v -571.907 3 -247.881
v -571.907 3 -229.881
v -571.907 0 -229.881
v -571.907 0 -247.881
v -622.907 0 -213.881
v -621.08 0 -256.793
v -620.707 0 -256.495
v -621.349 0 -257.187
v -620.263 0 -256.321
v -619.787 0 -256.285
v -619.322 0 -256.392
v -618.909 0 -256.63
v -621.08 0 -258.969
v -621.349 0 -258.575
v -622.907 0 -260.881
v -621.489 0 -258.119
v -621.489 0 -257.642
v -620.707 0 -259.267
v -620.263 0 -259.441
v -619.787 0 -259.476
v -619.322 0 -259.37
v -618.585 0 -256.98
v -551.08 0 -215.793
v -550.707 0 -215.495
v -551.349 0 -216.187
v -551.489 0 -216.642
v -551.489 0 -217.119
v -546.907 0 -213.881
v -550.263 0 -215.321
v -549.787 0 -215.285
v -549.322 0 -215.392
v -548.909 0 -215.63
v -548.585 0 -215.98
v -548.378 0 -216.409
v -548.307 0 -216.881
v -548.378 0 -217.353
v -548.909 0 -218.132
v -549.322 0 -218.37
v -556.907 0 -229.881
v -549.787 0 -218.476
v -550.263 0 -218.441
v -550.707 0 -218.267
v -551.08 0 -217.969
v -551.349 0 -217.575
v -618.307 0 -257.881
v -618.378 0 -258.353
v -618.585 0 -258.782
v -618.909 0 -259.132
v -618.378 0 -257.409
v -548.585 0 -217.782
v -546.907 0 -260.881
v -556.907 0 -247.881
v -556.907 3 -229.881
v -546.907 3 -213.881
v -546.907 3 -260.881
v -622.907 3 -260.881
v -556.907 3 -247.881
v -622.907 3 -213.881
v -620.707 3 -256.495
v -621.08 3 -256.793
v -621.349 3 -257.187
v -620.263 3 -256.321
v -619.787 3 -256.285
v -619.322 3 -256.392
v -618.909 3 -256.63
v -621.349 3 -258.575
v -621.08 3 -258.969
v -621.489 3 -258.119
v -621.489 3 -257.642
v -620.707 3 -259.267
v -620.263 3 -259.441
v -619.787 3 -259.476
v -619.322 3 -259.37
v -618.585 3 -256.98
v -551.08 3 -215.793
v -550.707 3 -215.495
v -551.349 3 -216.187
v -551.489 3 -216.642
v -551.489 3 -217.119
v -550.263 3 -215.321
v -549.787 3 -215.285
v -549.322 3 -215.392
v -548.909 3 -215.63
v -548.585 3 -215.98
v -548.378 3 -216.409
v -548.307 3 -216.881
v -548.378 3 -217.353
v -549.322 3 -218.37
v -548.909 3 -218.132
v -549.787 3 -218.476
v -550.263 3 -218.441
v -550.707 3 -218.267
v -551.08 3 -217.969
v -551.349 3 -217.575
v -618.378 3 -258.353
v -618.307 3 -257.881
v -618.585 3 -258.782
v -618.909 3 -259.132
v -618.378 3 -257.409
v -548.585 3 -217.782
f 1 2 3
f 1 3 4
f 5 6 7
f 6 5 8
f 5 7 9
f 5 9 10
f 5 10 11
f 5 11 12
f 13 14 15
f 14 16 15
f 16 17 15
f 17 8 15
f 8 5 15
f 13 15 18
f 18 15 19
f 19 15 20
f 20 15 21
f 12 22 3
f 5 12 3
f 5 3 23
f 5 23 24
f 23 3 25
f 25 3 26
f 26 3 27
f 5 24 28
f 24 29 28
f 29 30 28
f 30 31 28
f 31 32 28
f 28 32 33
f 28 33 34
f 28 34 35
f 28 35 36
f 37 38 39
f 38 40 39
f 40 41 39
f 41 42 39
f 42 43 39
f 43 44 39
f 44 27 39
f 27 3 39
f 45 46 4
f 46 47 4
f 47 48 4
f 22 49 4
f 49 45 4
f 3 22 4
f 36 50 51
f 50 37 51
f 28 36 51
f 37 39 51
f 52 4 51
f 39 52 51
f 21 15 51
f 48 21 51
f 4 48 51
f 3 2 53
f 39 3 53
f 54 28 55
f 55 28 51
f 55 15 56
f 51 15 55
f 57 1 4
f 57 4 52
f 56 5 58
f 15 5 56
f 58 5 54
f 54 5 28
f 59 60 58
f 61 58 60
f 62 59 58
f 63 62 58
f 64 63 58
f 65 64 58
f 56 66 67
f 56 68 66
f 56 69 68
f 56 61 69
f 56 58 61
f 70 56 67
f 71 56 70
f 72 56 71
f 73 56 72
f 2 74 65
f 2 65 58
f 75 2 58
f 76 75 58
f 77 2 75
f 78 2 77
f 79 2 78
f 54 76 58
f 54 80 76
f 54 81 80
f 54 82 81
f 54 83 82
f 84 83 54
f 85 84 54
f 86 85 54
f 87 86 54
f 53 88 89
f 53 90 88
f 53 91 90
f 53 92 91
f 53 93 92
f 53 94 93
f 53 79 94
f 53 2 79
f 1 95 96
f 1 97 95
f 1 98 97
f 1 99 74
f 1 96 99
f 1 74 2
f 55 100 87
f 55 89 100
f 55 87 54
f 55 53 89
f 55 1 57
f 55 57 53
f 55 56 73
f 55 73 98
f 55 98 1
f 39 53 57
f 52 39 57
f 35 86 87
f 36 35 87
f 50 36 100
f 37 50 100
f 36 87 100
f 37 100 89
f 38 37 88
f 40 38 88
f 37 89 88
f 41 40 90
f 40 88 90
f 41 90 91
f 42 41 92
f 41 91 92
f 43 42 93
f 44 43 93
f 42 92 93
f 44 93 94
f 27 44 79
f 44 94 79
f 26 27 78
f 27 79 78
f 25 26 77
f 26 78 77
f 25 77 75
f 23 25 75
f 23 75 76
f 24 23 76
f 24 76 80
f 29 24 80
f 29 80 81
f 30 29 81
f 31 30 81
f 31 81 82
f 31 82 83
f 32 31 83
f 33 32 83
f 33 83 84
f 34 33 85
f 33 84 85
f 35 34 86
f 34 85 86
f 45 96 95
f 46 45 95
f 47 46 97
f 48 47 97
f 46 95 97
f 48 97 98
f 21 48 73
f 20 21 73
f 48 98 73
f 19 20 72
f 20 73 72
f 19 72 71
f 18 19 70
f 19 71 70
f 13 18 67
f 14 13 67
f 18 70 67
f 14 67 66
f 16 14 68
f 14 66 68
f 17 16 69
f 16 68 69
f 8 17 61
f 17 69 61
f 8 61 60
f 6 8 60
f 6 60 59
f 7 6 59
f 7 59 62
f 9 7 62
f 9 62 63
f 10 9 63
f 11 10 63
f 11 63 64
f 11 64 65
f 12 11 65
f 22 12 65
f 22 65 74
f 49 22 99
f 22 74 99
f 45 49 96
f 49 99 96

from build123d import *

# Parameters (mm, degrees)
SKETCH1_W           = 76
SKETCH1_H           = 47
BOSS_EXTRUDE2_DEPTH = 3
SKETCH2_R           = 1.6
CUT_EXTRUDE1_DEPTH  = 3
SKETCH3_W           = 15
SKETCH3_H           = 18
CUT_EXTRUDE3_DEPTH  = 3


with BuildPart() as part:
    # Sketch1 → Boss-Extrude2 (new body)
    with BuildSketch(Plane(origin=(0, 0, 0), x_dir=(1, 0, 0), z_dir=(0, 1, 0))):
        with Locations((-584.907023411, 237.380936455)):
            Rectangle(SKETCH1_W, SKETCH1_H)
    extrude(amount=BOSS_EXTRUDE2_DEPTH)

    # Sketch2 → Cut-Extrude1 (cut)
    with BuildSketch(Plane(origin=(0, 3, 0), x_dir=(1, 0, 0), z_dir=(0, 1, 0))):
        with Locations((-619.907023411, 257.880936455)):
            Circle(SKETCH2_R)
        with Locations((-549.907023411, 216.880936455)):
            Circle(SKETCH2_R)
    extrude(amount=-CUT_EXTRUDE1_DEPTH, mode=Mode.SUBTRACT)

    # Sketch3 → Cut-Extrude3 (cut)
    with BuildSketch(Plane(origin=(0, 3, 0), x_dir=(1, 0, 0), z_dir=(0, 1, 0))):
        with Locations((-564.407023411, 238.880936455)):
            Rectangle(SKETCH3_W, SKETCH3_H)
    extrude(amount=-CUT_EXTRUDE3_DEPTH, mode=Mode.SUBTRACT)


solid = part.part
